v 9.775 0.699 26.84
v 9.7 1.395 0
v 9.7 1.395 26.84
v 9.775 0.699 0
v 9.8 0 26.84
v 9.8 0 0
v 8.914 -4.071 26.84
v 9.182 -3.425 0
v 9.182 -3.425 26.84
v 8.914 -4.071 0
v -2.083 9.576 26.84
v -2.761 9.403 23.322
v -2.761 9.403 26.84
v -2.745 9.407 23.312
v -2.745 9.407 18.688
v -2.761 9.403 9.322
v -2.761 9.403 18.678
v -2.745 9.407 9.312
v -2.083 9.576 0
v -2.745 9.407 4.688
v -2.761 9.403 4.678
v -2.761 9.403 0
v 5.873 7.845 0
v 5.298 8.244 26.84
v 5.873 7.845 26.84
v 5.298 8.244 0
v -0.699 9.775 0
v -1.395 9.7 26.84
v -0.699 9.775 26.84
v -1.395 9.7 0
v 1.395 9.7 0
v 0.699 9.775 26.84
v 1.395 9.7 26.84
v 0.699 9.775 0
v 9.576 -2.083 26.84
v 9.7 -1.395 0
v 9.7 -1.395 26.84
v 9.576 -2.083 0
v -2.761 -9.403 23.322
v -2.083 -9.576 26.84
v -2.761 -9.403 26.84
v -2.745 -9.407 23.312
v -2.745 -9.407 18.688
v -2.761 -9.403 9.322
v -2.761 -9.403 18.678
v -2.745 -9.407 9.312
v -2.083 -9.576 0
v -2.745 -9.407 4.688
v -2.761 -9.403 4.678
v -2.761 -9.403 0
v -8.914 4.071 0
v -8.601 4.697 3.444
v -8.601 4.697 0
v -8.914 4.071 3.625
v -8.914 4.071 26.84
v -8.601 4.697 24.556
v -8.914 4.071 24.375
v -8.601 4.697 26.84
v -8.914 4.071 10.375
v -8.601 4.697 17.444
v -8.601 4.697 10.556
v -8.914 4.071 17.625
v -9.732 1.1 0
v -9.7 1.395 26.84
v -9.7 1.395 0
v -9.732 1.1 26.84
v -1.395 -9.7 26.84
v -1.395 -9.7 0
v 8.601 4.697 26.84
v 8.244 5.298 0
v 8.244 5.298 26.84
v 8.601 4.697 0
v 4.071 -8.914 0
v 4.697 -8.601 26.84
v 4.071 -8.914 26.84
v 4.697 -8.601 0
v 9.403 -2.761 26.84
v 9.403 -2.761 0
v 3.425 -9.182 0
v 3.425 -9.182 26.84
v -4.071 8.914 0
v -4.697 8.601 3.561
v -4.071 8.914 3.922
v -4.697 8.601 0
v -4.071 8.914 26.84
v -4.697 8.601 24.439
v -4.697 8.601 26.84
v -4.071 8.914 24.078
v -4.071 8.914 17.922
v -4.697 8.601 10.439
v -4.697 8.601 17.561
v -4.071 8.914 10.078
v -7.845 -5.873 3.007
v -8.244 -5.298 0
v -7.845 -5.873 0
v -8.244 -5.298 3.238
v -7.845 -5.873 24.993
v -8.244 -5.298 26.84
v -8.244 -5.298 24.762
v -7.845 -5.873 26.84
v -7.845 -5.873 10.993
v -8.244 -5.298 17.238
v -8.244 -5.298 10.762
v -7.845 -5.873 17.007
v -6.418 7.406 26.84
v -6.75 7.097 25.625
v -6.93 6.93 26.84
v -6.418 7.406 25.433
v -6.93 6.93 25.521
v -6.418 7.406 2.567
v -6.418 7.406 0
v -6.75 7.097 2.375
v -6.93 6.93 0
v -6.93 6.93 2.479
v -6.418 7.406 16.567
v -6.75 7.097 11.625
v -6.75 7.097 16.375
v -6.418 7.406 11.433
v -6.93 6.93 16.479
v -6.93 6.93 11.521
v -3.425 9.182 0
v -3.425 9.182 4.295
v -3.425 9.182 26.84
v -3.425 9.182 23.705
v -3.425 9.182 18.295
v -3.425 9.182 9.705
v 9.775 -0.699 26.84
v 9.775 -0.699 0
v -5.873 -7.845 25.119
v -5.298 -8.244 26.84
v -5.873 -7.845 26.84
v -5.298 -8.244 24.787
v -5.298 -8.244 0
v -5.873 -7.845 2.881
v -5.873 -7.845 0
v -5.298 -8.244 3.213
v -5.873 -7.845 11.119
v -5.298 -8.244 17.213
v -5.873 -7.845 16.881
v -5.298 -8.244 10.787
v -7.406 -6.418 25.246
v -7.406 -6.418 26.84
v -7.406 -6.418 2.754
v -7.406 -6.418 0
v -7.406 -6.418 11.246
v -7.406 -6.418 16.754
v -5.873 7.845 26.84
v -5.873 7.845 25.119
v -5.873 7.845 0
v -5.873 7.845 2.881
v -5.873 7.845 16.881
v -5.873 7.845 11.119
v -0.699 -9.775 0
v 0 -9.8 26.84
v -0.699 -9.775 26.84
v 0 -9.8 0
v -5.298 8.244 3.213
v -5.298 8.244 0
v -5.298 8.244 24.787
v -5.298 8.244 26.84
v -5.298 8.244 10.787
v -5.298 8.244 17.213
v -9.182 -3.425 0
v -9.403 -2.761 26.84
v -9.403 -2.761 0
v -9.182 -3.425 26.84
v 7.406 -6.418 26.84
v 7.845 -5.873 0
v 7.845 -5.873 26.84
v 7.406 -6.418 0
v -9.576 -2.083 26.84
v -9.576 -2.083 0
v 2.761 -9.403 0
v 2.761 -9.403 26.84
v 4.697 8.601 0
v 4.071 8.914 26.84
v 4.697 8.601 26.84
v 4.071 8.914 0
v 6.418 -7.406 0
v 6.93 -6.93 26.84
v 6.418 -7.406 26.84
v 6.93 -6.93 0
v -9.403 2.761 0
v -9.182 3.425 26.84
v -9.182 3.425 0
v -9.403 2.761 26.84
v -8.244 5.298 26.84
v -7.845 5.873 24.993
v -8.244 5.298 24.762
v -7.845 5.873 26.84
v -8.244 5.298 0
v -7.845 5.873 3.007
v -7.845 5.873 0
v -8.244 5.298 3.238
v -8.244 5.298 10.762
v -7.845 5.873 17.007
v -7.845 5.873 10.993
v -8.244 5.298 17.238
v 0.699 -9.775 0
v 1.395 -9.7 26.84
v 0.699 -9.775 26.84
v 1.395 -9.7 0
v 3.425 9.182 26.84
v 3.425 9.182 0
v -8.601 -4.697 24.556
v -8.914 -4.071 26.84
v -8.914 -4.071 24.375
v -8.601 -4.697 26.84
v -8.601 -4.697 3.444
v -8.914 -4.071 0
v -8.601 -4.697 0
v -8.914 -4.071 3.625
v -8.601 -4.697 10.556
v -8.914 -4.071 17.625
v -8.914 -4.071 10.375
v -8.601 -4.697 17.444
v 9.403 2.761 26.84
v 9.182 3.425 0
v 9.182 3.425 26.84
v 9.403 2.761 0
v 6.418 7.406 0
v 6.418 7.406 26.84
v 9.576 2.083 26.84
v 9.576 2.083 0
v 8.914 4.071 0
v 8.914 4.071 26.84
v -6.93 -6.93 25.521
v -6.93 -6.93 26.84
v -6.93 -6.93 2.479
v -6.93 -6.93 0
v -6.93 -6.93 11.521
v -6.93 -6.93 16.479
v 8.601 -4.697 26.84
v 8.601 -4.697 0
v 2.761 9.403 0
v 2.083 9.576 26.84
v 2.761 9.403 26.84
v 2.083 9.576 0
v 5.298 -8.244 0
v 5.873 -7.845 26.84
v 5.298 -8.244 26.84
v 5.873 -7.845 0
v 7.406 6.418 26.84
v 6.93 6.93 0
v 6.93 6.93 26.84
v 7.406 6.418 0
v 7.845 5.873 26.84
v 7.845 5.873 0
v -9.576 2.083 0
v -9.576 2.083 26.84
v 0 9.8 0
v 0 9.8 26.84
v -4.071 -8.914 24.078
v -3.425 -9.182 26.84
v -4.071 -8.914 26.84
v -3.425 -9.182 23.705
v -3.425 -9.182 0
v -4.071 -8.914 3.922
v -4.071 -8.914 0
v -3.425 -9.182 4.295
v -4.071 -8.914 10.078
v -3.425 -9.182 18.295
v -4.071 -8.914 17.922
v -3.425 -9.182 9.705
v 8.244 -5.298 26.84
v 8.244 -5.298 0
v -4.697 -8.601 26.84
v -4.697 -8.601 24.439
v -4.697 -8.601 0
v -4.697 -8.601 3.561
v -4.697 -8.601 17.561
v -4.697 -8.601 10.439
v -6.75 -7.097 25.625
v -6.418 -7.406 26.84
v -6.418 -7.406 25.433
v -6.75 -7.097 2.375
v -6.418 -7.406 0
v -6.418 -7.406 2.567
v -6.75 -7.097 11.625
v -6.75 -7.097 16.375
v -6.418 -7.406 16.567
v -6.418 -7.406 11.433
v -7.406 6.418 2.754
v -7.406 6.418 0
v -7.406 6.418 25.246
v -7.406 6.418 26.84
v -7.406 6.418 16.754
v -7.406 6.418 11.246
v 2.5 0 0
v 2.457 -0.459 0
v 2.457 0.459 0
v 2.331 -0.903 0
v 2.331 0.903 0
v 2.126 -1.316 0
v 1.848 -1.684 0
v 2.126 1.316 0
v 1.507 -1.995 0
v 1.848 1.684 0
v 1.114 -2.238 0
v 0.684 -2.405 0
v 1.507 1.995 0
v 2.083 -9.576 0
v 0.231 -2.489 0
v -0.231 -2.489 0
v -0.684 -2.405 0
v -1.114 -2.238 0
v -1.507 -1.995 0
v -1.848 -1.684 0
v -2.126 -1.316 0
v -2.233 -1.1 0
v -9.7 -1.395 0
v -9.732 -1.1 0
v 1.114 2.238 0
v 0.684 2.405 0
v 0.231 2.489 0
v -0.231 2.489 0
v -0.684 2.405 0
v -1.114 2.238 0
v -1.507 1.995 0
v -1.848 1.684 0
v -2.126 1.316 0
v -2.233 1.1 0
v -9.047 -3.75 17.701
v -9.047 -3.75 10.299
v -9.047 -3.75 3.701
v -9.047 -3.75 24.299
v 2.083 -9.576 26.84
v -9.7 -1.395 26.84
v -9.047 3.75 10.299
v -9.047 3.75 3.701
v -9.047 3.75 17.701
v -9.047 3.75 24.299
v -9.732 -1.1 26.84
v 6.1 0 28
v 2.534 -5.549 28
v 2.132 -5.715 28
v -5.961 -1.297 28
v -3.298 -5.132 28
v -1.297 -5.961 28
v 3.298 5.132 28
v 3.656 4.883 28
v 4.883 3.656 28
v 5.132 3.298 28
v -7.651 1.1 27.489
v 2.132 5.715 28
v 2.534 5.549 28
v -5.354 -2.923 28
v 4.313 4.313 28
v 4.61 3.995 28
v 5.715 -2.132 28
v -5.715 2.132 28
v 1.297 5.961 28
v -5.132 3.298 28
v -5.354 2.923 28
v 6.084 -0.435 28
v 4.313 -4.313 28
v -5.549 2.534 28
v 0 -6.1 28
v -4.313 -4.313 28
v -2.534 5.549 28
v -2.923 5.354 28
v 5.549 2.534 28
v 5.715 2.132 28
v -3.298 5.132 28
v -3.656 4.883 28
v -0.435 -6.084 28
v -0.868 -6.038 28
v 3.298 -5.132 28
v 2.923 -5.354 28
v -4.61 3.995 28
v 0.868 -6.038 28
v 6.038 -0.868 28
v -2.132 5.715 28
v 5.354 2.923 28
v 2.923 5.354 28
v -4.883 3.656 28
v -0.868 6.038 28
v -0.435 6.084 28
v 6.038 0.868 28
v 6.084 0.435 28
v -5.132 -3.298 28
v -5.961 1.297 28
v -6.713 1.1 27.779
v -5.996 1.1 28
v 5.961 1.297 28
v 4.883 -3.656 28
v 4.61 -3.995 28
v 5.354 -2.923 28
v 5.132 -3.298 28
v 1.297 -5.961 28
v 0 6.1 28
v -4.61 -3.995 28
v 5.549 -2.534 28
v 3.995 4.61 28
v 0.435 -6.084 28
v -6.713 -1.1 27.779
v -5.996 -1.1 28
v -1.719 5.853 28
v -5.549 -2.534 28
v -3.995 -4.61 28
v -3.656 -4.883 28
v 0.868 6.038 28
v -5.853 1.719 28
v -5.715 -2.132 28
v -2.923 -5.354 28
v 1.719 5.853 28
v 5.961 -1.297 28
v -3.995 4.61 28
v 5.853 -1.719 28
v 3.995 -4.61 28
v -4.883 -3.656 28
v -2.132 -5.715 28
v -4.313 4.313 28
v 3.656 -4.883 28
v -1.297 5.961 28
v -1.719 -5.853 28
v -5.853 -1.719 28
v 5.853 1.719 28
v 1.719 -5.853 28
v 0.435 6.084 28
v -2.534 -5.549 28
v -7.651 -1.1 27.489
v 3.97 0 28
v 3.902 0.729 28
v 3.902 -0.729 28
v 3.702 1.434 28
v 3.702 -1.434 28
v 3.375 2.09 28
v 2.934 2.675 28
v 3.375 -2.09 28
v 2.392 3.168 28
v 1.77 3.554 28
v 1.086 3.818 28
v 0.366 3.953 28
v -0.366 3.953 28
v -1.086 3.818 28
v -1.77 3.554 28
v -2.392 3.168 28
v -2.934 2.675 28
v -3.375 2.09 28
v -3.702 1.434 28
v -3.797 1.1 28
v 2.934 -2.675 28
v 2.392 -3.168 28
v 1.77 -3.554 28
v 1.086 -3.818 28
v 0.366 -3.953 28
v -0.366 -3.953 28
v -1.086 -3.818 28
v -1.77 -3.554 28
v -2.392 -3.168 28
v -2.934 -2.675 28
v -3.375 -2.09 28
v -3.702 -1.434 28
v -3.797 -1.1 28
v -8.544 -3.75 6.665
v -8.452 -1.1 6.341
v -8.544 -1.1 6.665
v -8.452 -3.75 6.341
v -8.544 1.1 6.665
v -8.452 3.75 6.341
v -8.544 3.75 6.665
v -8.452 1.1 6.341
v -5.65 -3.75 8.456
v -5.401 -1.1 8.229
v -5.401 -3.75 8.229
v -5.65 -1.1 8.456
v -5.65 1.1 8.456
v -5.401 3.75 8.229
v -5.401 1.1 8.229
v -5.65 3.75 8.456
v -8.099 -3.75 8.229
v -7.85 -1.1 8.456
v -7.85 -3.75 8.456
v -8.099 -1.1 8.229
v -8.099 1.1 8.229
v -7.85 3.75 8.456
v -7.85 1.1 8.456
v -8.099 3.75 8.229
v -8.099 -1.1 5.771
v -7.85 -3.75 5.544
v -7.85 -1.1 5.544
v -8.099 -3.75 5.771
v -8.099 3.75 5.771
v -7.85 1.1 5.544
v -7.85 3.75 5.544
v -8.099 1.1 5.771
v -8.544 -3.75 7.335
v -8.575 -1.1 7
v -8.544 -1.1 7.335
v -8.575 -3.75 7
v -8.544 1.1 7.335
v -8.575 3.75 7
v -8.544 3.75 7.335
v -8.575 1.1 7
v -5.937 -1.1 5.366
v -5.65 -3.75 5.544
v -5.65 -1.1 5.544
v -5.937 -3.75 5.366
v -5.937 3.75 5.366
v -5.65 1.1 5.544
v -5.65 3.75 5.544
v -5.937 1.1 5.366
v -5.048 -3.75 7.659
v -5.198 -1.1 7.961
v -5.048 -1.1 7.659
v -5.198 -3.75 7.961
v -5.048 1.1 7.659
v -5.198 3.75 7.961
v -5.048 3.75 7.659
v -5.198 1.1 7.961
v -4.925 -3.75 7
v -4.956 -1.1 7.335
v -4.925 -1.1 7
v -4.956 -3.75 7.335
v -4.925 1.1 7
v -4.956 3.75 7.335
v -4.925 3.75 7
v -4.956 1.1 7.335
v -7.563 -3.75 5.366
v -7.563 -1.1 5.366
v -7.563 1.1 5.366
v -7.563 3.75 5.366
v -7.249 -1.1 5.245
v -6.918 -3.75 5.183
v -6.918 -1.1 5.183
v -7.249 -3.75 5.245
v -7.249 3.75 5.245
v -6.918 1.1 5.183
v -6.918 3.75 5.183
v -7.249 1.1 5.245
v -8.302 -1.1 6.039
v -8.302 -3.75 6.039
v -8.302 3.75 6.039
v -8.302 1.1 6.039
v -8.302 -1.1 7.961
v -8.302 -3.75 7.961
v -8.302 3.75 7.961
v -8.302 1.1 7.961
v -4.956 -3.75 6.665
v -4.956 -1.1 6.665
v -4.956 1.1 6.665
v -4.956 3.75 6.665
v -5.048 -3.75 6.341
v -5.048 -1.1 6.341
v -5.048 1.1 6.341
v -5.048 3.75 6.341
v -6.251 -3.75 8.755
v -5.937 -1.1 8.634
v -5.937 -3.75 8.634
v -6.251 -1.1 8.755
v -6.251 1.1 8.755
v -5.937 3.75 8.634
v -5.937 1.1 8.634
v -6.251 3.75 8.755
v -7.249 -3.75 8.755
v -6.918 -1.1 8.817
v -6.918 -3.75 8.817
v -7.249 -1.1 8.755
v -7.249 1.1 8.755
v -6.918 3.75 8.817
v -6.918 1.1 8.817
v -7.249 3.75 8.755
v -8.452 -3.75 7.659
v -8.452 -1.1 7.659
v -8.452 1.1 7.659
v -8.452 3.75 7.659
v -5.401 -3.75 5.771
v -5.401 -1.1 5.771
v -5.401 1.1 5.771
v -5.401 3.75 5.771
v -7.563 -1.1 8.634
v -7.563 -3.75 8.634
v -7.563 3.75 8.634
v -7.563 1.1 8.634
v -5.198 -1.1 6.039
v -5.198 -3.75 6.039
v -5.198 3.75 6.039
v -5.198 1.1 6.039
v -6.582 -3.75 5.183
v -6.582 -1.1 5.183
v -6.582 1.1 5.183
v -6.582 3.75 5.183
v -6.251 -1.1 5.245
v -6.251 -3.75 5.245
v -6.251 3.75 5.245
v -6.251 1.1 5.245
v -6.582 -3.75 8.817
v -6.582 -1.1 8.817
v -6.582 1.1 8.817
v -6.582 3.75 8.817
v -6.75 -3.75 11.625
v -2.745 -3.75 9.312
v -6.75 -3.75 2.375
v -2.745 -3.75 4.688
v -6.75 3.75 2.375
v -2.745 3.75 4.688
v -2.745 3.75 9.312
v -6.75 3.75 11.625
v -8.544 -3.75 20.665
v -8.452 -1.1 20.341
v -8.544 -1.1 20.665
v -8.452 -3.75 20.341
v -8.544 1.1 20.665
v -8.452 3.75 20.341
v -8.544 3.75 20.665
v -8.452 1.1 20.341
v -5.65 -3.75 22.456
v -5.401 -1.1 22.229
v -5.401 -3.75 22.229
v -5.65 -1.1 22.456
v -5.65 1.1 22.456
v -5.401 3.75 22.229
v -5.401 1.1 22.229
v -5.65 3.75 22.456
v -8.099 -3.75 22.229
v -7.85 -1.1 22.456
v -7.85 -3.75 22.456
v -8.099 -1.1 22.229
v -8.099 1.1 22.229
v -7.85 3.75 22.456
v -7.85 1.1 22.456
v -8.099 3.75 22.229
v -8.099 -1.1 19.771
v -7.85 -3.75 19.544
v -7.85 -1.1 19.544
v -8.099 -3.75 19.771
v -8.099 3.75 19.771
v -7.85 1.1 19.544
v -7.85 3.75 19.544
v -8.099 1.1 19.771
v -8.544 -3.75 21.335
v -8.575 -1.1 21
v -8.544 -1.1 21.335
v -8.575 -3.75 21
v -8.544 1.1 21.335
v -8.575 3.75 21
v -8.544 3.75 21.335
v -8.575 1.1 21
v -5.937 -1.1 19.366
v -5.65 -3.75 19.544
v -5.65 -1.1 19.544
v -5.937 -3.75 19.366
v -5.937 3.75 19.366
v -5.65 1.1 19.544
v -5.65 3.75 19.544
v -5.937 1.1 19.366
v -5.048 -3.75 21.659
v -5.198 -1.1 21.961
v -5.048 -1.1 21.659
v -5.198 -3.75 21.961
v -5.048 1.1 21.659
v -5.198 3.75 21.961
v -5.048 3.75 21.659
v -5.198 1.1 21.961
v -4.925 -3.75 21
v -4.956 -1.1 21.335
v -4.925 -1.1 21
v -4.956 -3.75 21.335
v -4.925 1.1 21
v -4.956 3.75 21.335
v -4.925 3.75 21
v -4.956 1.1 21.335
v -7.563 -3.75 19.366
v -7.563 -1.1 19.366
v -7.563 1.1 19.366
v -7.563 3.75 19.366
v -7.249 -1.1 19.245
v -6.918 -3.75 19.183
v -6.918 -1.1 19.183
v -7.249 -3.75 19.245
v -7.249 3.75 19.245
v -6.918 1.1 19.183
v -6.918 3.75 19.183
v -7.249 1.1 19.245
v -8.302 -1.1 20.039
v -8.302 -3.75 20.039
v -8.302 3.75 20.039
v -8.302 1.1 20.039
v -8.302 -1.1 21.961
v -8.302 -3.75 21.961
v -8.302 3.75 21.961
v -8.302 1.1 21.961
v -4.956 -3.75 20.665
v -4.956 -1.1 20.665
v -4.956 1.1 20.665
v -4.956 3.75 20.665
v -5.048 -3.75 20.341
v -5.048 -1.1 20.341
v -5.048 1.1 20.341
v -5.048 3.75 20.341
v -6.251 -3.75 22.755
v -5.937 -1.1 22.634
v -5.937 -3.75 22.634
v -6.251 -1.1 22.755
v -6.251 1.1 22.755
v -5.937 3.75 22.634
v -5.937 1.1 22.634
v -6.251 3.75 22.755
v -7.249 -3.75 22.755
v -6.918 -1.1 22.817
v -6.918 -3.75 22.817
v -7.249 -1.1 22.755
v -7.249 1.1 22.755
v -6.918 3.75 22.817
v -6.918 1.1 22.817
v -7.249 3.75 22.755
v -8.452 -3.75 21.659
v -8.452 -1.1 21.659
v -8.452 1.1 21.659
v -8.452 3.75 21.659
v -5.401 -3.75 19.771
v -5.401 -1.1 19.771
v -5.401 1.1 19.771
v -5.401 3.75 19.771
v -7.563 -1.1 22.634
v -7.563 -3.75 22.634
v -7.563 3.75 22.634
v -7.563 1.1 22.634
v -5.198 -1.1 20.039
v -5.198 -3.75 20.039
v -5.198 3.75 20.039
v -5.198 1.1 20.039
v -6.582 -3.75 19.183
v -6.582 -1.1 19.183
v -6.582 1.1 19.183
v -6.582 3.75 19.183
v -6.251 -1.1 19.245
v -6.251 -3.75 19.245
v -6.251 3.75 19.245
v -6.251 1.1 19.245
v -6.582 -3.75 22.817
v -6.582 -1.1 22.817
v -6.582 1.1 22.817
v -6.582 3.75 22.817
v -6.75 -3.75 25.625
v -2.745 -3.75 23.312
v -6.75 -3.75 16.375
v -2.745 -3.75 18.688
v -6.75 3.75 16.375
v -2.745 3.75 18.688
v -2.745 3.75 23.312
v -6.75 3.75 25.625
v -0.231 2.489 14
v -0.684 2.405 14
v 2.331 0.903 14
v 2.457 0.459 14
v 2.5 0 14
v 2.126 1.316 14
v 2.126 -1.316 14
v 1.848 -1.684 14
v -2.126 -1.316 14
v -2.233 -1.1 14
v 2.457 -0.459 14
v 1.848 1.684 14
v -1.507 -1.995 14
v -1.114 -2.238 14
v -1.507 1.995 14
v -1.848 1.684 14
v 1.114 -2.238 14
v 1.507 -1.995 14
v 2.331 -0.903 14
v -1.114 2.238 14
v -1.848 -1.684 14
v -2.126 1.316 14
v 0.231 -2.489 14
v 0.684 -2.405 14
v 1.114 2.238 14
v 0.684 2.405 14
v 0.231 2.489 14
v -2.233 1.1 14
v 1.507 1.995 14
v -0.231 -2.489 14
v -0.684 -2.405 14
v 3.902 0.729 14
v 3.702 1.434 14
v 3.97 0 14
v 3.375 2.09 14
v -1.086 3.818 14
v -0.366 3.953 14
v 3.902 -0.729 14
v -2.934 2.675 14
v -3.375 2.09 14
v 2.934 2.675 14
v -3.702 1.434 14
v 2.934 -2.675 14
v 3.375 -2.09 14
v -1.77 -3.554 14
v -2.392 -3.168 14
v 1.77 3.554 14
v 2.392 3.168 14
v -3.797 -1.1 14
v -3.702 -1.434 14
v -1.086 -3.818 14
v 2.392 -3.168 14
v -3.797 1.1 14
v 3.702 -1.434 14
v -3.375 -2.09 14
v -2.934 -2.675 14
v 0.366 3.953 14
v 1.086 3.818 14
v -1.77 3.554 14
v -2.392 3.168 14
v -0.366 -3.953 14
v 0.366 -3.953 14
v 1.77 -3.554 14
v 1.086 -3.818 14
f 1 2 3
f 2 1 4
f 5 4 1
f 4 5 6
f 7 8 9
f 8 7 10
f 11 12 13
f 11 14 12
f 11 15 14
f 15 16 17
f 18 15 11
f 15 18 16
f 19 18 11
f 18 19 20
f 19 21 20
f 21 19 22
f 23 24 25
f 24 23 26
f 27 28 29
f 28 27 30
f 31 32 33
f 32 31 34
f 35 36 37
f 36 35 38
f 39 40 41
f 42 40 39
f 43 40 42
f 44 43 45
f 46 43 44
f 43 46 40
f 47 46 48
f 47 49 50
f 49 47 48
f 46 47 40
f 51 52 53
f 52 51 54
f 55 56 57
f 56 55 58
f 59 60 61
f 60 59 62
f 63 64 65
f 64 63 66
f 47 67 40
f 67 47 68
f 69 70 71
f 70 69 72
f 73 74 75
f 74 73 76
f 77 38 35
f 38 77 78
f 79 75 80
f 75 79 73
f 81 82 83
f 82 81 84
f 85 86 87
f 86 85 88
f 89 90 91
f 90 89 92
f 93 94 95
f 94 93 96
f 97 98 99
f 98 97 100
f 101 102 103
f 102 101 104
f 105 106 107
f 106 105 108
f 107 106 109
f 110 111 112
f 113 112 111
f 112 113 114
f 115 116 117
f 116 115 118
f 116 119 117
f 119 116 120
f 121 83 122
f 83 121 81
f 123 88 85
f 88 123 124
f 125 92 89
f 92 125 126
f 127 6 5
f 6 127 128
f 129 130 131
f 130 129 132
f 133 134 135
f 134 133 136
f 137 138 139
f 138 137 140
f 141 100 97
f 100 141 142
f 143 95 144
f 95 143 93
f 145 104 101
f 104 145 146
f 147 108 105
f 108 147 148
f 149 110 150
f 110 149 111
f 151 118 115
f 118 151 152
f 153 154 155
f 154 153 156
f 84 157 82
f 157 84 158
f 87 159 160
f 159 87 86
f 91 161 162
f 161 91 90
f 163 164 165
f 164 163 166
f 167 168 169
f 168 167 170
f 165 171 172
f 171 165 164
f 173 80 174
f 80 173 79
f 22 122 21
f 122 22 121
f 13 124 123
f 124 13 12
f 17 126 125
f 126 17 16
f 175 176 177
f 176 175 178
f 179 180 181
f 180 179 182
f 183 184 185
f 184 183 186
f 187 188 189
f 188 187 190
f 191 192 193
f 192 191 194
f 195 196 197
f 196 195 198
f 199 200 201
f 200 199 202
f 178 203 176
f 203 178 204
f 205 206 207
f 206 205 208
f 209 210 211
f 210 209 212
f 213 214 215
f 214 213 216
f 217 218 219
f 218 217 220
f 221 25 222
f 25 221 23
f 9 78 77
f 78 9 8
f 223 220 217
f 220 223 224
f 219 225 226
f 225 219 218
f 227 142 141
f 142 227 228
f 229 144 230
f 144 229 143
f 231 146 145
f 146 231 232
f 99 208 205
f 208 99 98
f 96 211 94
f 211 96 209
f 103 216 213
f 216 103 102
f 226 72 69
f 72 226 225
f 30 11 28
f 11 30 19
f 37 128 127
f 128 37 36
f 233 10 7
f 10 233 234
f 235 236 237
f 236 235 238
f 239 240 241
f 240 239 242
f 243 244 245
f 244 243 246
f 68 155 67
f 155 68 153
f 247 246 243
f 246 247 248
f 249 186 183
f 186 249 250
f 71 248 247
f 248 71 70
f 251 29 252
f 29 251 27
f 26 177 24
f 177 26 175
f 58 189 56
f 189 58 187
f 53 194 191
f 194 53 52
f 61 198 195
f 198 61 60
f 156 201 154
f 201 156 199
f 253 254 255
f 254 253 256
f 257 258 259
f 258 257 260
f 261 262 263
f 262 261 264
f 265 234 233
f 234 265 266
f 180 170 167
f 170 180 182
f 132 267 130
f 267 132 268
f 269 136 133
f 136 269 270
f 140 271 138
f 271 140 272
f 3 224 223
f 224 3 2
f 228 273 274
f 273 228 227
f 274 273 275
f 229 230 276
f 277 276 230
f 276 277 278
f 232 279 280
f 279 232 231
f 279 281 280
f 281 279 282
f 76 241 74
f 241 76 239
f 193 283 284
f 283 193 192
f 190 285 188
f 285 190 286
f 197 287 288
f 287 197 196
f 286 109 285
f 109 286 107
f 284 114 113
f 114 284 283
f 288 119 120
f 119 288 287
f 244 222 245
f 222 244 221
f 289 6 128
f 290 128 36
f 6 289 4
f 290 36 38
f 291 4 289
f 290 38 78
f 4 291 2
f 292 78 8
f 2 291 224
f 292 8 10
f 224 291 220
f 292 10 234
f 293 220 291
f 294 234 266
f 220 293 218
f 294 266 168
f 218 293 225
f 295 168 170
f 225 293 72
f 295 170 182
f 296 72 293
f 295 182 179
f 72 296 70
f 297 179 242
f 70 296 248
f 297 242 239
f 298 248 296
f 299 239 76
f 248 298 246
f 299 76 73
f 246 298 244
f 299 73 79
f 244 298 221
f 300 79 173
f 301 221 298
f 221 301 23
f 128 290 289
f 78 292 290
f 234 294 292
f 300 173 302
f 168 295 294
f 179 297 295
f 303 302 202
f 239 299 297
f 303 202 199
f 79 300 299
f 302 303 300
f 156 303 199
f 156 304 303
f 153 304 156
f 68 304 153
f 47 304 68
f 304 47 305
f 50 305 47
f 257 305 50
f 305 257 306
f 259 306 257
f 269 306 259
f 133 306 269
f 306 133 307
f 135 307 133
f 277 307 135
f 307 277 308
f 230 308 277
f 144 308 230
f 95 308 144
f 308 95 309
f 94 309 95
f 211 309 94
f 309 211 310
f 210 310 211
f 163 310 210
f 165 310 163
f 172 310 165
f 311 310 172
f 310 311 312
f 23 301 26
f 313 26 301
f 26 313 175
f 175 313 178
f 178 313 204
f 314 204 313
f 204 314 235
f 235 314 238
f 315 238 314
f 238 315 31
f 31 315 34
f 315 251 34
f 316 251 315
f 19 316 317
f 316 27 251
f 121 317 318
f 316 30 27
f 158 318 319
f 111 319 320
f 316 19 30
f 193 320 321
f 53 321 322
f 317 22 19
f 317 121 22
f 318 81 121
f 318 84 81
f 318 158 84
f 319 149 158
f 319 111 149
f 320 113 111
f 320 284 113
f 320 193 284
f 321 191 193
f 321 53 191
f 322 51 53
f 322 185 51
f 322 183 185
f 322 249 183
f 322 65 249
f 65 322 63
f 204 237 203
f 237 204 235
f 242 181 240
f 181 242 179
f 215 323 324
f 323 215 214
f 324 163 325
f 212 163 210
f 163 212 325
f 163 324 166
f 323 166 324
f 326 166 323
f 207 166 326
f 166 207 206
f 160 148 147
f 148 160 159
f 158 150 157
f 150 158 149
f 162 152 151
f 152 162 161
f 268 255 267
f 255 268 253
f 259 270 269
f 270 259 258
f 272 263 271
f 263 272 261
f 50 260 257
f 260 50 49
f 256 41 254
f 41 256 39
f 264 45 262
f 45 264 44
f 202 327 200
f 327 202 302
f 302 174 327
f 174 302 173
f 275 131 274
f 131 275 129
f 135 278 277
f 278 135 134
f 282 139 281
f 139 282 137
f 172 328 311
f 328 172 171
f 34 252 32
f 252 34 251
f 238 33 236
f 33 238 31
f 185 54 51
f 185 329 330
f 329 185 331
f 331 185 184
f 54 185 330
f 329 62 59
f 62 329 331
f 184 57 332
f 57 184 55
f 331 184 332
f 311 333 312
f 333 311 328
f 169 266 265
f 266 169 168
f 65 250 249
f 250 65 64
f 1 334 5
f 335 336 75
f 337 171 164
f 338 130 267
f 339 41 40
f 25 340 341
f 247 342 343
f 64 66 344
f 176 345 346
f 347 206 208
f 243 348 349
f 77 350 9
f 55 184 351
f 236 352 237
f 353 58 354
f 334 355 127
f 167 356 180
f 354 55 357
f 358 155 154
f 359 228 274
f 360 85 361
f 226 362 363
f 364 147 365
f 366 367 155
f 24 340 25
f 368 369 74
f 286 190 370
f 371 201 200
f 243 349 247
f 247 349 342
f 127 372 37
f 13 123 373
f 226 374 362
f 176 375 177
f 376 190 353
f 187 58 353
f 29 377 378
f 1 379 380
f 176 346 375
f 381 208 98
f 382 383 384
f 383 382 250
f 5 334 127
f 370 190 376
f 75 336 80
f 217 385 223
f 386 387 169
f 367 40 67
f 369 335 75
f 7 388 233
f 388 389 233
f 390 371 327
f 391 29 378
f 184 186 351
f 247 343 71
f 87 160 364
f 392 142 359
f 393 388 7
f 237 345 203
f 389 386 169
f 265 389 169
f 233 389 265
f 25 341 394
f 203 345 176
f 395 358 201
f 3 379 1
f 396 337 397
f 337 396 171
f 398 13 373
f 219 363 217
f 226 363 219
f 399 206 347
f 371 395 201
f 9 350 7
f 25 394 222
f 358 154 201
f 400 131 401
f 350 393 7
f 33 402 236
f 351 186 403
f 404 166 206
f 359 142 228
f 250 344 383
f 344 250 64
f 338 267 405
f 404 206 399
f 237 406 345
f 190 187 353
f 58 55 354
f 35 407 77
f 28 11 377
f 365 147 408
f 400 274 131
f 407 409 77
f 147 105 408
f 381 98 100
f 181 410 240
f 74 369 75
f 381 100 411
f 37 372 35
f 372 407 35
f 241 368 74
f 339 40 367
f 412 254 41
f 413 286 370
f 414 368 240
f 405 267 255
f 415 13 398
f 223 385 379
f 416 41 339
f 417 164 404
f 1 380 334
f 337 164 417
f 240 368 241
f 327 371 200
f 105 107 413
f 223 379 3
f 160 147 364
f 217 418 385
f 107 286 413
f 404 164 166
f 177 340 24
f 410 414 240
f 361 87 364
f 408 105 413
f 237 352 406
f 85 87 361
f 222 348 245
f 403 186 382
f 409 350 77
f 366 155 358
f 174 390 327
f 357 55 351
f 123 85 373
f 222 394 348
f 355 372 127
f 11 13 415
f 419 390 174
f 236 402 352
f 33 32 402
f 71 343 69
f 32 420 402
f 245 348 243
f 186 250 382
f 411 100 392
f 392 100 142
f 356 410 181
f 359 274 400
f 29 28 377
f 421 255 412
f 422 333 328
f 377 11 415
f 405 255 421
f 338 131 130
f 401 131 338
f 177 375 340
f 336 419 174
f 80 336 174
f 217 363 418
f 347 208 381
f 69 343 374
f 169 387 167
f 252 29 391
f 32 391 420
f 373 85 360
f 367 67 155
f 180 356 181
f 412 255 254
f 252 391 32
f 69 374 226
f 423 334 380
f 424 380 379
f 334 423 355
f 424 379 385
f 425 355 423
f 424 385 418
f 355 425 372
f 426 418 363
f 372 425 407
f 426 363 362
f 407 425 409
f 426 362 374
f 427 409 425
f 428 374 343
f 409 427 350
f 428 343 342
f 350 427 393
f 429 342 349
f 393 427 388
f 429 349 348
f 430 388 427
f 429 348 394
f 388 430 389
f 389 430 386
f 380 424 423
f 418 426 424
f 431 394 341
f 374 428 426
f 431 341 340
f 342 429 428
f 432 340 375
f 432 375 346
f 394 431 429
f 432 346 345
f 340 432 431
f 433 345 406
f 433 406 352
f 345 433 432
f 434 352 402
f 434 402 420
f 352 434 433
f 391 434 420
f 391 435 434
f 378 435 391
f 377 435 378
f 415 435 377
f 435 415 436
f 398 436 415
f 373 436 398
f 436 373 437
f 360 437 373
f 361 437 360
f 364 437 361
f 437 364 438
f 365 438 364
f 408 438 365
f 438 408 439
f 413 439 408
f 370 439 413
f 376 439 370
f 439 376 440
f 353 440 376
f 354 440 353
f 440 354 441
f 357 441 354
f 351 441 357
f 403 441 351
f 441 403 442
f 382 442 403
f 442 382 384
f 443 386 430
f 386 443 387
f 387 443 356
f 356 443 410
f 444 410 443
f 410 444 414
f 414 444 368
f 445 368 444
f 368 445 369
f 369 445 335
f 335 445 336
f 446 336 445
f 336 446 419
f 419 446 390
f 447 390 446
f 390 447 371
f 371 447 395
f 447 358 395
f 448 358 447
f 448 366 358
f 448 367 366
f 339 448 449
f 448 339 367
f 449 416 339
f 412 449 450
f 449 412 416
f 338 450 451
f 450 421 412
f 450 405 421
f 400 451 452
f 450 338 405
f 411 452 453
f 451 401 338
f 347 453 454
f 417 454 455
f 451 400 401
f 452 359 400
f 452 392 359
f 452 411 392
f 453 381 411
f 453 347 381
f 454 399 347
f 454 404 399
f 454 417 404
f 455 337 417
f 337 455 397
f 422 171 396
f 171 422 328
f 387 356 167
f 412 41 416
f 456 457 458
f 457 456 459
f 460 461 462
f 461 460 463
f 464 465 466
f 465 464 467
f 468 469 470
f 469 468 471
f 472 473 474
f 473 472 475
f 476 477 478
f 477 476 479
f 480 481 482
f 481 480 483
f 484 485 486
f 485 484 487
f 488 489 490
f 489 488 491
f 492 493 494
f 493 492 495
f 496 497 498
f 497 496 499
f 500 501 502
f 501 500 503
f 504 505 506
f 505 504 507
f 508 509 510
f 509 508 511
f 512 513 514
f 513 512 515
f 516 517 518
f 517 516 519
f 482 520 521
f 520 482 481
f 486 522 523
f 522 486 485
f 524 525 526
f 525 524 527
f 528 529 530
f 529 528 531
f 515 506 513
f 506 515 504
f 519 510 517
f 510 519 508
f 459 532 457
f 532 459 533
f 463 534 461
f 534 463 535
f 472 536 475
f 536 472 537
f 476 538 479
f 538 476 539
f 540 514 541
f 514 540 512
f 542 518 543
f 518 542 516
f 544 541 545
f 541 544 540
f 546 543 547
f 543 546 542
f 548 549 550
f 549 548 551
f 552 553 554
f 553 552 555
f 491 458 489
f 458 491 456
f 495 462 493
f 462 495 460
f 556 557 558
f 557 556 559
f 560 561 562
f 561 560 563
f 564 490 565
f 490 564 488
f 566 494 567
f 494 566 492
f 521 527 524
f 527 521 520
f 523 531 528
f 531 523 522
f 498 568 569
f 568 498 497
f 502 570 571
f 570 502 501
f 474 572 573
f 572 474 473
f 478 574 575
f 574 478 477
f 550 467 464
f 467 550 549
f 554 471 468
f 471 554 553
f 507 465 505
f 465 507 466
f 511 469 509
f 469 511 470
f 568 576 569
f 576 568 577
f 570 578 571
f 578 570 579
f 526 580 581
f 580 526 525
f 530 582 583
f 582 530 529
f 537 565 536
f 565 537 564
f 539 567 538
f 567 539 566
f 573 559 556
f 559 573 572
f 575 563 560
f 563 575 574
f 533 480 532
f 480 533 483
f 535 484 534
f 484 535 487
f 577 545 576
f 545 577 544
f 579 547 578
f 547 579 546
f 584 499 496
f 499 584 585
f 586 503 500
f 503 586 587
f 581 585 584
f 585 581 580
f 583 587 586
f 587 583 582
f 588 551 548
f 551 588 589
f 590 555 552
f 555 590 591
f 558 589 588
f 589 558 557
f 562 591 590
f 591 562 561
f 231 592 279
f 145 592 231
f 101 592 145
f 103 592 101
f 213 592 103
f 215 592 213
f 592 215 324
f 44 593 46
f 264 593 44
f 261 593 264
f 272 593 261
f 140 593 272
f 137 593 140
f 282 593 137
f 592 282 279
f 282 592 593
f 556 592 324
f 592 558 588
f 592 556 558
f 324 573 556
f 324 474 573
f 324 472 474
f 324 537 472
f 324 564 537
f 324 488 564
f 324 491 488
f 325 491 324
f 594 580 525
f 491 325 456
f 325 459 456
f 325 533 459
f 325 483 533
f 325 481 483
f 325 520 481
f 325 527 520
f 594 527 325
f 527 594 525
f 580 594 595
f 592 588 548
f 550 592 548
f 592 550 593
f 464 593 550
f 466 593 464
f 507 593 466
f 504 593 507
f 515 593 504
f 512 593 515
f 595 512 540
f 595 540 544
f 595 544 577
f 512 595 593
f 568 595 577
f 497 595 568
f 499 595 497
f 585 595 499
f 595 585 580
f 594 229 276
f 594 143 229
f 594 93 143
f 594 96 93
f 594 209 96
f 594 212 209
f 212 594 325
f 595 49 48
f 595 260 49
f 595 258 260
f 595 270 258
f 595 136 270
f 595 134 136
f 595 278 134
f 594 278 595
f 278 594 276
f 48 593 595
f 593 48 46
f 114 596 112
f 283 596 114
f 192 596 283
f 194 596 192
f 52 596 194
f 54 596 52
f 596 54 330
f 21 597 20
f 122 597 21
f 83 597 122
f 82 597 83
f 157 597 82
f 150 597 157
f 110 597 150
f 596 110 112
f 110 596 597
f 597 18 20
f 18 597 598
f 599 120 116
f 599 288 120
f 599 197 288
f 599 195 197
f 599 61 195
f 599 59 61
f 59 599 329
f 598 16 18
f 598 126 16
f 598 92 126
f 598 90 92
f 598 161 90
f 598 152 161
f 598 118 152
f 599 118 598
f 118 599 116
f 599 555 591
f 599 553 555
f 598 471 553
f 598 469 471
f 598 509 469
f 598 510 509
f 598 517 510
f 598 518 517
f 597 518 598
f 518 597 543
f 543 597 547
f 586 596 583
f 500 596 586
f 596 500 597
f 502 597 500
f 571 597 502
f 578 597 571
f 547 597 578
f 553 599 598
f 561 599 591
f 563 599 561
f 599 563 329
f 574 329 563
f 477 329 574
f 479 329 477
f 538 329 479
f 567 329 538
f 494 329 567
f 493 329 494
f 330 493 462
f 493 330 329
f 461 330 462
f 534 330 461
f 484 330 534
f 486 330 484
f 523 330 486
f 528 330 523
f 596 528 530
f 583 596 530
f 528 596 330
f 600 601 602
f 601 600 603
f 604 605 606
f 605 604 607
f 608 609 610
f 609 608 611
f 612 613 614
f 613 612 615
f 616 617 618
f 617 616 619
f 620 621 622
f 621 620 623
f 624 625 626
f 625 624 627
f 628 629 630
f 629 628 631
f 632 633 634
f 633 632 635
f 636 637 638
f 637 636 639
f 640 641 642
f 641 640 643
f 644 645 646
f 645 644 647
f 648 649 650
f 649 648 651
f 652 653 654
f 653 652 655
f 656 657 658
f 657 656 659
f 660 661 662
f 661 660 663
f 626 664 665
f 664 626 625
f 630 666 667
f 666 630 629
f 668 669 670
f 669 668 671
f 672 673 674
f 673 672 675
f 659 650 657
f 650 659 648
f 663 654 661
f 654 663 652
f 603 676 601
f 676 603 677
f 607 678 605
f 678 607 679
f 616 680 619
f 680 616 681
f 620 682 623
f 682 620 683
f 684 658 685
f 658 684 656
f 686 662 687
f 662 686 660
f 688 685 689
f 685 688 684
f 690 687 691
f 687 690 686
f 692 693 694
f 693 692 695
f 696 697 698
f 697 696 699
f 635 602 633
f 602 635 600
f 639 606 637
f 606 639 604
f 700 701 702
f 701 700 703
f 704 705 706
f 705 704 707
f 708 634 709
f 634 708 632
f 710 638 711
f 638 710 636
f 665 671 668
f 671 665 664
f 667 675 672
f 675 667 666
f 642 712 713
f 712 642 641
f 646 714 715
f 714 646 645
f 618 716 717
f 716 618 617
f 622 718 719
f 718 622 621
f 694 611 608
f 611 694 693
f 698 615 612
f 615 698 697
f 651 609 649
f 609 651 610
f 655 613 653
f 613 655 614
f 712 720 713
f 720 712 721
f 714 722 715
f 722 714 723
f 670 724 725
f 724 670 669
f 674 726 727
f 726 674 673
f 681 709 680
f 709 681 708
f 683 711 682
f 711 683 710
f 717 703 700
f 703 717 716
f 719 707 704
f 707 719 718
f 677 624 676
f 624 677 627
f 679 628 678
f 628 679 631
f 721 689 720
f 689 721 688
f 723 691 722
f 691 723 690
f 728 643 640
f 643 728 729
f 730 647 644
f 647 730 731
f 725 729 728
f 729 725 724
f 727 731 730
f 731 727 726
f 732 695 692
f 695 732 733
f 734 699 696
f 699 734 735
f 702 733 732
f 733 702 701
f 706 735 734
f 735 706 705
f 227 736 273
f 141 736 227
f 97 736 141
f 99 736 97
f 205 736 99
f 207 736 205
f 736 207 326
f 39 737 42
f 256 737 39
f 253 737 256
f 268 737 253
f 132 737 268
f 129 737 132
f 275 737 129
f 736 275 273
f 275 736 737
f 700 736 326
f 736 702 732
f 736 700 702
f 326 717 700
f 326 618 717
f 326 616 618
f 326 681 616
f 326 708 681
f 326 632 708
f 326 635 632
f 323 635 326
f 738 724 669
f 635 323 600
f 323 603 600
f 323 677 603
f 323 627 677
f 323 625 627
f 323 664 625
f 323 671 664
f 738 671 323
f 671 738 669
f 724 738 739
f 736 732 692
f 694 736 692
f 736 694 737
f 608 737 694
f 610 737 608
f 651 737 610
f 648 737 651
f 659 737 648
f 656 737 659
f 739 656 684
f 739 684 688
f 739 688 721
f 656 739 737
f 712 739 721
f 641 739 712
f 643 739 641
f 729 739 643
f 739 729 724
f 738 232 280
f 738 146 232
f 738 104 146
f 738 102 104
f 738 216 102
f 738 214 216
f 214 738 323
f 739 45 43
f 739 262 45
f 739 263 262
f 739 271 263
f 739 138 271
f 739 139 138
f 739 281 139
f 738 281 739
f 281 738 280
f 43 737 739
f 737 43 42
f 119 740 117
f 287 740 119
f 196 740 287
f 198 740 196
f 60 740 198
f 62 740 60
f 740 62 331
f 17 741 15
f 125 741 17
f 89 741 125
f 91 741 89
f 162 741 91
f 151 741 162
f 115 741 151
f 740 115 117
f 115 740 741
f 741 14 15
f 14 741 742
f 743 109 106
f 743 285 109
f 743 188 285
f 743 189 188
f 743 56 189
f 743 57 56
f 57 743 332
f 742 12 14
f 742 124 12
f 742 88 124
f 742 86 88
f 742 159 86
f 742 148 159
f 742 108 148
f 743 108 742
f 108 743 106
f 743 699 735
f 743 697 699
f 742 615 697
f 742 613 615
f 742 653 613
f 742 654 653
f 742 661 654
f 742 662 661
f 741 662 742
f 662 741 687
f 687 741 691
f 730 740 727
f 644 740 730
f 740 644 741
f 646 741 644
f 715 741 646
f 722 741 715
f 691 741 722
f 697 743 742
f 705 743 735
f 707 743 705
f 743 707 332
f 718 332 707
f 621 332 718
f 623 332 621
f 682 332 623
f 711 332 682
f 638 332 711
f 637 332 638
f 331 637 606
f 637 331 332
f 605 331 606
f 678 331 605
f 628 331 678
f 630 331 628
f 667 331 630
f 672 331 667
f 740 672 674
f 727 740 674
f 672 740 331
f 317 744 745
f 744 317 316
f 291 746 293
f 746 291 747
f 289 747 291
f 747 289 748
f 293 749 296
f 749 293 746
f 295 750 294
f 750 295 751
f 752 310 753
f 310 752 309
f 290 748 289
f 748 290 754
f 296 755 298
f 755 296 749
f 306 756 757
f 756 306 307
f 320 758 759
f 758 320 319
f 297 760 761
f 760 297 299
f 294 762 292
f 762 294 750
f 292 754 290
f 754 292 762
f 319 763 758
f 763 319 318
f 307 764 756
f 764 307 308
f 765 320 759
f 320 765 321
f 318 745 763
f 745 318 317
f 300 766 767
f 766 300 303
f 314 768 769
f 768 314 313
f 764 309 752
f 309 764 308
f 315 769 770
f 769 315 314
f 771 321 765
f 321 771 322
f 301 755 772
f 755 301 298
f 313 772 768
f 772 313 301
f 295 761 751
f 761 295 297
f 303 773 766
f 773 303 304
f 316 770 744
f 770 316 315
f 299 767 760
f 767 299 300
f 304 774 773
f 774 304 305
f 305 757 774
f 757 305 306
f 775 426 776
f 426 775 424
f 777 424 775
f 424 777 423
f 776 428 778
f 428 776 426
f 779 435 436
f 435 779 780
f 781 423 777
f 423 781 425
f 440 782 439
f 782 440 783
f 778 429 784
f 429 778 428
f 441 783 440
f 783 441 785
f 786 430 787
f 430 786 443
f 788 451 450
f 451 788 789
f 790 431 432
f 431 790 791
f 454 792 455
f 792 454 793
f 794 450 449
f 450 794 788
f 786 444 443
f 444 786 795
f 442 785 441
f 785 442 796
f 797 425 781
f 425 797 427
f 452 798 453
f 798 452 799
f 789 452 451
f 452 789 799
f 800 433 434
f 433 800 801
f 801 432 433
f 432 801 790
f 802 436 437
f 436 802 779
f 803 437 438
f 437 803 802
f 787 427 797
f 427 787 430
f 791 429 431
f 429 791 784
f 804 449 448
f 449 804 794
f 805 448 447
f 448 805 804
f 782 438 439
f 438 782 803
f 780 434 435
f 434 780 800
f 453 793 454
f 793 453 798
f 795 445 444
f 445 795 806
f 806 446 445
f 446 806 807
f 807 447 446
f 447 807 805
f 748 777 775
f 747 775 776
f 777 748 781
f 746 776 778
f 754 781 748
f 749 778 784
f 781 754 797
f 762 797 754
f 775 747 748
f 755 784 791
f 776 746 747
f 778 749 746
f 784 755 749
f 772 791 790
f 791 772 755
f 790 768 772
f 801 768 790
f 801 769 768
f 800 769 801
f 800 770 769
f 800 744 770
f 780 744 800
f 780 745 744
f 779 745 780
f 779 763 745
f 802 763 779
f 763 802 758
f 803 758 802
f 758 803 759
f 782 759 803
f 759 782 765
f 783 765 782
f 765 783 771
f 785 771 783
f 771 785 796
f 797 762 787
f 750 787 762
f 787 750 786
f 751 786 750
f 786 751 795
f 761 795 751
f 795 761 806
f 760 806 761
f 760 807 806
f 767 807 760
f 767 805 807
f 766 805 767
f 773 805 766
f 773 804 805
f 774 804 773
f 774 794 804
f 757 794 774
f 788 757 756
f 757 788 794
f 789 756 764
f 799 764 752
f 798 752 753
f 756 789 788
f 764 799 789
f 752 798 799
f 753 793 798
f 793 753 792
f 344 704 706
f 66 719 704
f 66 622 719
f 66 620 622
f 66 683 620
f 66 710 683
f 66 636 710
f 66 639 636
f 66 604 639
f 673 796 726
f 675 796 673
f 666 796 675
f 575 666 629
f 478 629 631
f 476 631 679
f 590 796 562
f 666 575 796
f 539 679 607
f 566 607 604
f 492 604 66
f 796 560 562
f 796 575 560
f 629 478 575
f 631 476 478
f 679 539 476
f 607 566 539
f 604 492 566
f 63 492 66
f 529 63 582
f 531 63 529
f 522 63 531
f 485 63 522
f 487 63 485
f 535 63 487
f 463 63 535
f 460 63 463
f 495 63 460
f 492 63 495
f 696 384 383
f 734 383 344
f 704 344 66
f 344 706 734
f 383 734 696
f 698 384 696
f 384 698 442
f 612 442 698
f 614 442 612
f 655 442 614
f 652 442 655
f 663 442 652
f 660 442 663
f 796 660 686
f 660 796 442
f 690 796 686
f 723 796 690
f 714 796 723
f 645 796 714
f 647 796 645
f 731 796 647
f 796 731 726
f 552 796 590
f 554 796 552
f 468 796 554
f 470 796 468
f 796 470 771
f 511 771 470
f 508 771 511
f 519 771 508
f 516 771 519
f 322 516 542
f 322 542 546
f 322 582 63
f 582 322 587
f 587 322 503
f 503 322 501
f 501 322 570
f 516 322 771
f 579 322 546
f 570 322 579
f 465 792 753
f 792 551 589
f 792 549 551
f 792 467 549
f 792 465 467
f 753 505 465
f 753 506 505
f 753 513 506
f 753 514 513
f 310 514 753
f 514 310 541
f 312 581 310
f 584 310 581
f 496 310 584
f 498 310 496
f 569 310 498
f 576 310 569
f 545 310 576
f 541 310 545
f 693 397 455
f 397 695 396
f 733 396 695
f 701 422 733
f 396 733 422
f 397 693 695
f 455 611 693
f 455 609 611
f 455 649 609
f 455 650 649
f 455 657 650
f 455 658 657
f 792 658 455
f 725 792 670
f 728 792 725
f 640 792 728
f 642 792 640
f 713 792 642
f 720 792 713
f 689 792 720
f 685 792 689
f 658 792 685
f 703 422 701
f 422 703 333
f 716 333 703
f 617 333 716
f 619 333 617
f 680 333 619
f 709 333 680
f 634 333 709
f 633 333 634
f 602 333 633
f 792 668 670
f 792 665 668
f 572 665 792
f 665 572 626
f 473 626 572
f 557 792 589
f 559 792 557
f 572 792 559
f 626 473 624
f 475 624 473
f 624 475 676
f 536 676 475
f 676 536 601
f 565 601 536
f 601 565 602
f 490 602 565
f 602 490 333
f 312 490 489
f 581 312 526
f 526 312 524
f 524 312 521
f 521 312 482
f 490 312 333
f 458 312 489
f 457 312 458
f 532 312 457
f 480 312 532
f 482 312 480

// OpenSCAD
//Parametric Rigid Coupler
//By David Bunch 8/9/2015
//
//This design is based on the Rigid Coupler for the
//Mostly printed CNC machine http://www.thingiverse.com/thing:724999
//To couple a Nema 17 Motor shaft to a 5/16" threaded rod
//I only changed the connection diameter of the 5/16" threaded rod
//The little bolts used to tighten this design are #6 x 1/2" bolts
//If using metric, M4 x 14mm is closest
//CUSTOMIZER VARIABLES

//1. Outside Diameter of Coupler
OD = 19.6;

//2. Taper Height for Coupler
H2 = 1.16;

//3. Taper Outside Diameter of Coupler
ODT = 12.2;

//4. Total Height of Coupler
Ht = 28.0;

//5. Small Coupler Connection
M5 = 5.0;

//6. Large Coupler Connection
M8 = 7.94;                   //Originally 7.6mm (5/16" = 7.9375mm)

//7. Gap Cut size for Tightening Coupler
GapDist = 2.2;

//8. Coupling Bolt Diameter used for Tightening (#6 screw used here)
M4 = 3.65;              //Use 4.0 if using M4 bolts

//9. Coupling Bolt Diameter used for Tightening (#6 Nut default)
M4Nut = 9.25;           //if using M4 nuts, use 8.08mm

//10. Bolt Length (1/2" long bolt is default)
BoltLen = 12.7;         //This should still be a good length for
                        //14mm or 16mm length bolts,
                        //they will just stick out a little beyond locknut

//11. X Offset for Bolt Tightening Holes
M4_DX = 6.75;

//12. 1st Z Offset for Bolt Tightening Holes
M4_DZ1 = 7.0;

//13. 2nd Z Offset for Bolt Tightening Holes
M4_DZ2 = 21.0;

//14. Resolution large Circles
IresBig = 88;

//15. Resolution of Small Circles
IresSmall = 34;

//16. 1 part or 2 Halves
PartType = 1;   //2 Halves are useful if your 2 shafts are already in place
                //This maybe useful if you need to replace a broken coupling
                //without removing Z tower

//CUSTOMIZER VARIABLES END

M4_Thk = (BoltLen - GapDist - 5.2) / 2;
echo("M4_Thk = ", M4_Thk);

echo("H2 = ",H2);
H1 = Ht - H2;
echo("H1 = ",H1);

GapHalf = GapDist / 2;
M4Nut_DY = M4_Thk + GapHalf;

Rad = OD / 2;
//Draw the Main Coupler
module DrawUnion()
{
    union()
    {
        cylinder(d=OD,h=H1,$fn=IresBig);
        translate([0,0,H1])
        cylinder(d1=OD,d2=ODT,h=H2,$fn=IresBig);
    }
}
module HorizontalHoles()
{
    translate([0,0,M4_DZ1])
    BoltAndNutCut();            //Lower Horizontal Hole
    translate([0,0,M4_DZ2])
    BoltAndNutCut();            //Upper Horizontal Hole
}
//Cut out the holes, gap & draw final part
module DrawFinal()
{
    difference()
    {
        DrawUnion();
        translate([0,0,-1])
        cylinder(d=M5,h=Ht+2,$fn=IresSmall);
        translate([0,0,Ht / 2])
        cylinder(d=M8,h=Ht,$fn=IresSmall);
        translate([-(Rad+.01),-GapHalf,-1])
        cube([Rad,GapDist,Ht+2]);       //Cut gap for tightening
//Cut bottom bolt tightening hole
        HorizontalHoles(); 
        if (PartType == 2)
        {
            rotate([0,0,180])
            {
                HorizontalHoles();  //Cut horizontal holes for tightening bolts
                translate([-(Rad+.01),-GapHalf,-1])
                cube([Rad,GapDist,Ht+2]);       //Cut gap for tightening
            }
        }
    }
}
//These are the holes for the tightening bolts & nuts
module BoltAndNutCut()
{
//Drill hole all the way through
    translate([-M4_DX,Rad,0])
    rotate([90,0,0])
    cylinder(d=M4,h=OD,$fn=IresSmall);
//Cut for hex nut on one end
    translate([-M4_DX,-M4Nut_DY,0])
    rotate([90,0,0])
    rotate([0,0,30])
    cylinder(d=M4Nut,h=Rad,$fn=6); 
//Cut for hex nut on the other end
    translate([-M4_DX,M4Nut_DY,0])
    rotate([-90,0,0])
    rotate([0,0,30])
    cylinder(d=M4Nut,h=Rad,$fn=6);
}
DrawFinal();
